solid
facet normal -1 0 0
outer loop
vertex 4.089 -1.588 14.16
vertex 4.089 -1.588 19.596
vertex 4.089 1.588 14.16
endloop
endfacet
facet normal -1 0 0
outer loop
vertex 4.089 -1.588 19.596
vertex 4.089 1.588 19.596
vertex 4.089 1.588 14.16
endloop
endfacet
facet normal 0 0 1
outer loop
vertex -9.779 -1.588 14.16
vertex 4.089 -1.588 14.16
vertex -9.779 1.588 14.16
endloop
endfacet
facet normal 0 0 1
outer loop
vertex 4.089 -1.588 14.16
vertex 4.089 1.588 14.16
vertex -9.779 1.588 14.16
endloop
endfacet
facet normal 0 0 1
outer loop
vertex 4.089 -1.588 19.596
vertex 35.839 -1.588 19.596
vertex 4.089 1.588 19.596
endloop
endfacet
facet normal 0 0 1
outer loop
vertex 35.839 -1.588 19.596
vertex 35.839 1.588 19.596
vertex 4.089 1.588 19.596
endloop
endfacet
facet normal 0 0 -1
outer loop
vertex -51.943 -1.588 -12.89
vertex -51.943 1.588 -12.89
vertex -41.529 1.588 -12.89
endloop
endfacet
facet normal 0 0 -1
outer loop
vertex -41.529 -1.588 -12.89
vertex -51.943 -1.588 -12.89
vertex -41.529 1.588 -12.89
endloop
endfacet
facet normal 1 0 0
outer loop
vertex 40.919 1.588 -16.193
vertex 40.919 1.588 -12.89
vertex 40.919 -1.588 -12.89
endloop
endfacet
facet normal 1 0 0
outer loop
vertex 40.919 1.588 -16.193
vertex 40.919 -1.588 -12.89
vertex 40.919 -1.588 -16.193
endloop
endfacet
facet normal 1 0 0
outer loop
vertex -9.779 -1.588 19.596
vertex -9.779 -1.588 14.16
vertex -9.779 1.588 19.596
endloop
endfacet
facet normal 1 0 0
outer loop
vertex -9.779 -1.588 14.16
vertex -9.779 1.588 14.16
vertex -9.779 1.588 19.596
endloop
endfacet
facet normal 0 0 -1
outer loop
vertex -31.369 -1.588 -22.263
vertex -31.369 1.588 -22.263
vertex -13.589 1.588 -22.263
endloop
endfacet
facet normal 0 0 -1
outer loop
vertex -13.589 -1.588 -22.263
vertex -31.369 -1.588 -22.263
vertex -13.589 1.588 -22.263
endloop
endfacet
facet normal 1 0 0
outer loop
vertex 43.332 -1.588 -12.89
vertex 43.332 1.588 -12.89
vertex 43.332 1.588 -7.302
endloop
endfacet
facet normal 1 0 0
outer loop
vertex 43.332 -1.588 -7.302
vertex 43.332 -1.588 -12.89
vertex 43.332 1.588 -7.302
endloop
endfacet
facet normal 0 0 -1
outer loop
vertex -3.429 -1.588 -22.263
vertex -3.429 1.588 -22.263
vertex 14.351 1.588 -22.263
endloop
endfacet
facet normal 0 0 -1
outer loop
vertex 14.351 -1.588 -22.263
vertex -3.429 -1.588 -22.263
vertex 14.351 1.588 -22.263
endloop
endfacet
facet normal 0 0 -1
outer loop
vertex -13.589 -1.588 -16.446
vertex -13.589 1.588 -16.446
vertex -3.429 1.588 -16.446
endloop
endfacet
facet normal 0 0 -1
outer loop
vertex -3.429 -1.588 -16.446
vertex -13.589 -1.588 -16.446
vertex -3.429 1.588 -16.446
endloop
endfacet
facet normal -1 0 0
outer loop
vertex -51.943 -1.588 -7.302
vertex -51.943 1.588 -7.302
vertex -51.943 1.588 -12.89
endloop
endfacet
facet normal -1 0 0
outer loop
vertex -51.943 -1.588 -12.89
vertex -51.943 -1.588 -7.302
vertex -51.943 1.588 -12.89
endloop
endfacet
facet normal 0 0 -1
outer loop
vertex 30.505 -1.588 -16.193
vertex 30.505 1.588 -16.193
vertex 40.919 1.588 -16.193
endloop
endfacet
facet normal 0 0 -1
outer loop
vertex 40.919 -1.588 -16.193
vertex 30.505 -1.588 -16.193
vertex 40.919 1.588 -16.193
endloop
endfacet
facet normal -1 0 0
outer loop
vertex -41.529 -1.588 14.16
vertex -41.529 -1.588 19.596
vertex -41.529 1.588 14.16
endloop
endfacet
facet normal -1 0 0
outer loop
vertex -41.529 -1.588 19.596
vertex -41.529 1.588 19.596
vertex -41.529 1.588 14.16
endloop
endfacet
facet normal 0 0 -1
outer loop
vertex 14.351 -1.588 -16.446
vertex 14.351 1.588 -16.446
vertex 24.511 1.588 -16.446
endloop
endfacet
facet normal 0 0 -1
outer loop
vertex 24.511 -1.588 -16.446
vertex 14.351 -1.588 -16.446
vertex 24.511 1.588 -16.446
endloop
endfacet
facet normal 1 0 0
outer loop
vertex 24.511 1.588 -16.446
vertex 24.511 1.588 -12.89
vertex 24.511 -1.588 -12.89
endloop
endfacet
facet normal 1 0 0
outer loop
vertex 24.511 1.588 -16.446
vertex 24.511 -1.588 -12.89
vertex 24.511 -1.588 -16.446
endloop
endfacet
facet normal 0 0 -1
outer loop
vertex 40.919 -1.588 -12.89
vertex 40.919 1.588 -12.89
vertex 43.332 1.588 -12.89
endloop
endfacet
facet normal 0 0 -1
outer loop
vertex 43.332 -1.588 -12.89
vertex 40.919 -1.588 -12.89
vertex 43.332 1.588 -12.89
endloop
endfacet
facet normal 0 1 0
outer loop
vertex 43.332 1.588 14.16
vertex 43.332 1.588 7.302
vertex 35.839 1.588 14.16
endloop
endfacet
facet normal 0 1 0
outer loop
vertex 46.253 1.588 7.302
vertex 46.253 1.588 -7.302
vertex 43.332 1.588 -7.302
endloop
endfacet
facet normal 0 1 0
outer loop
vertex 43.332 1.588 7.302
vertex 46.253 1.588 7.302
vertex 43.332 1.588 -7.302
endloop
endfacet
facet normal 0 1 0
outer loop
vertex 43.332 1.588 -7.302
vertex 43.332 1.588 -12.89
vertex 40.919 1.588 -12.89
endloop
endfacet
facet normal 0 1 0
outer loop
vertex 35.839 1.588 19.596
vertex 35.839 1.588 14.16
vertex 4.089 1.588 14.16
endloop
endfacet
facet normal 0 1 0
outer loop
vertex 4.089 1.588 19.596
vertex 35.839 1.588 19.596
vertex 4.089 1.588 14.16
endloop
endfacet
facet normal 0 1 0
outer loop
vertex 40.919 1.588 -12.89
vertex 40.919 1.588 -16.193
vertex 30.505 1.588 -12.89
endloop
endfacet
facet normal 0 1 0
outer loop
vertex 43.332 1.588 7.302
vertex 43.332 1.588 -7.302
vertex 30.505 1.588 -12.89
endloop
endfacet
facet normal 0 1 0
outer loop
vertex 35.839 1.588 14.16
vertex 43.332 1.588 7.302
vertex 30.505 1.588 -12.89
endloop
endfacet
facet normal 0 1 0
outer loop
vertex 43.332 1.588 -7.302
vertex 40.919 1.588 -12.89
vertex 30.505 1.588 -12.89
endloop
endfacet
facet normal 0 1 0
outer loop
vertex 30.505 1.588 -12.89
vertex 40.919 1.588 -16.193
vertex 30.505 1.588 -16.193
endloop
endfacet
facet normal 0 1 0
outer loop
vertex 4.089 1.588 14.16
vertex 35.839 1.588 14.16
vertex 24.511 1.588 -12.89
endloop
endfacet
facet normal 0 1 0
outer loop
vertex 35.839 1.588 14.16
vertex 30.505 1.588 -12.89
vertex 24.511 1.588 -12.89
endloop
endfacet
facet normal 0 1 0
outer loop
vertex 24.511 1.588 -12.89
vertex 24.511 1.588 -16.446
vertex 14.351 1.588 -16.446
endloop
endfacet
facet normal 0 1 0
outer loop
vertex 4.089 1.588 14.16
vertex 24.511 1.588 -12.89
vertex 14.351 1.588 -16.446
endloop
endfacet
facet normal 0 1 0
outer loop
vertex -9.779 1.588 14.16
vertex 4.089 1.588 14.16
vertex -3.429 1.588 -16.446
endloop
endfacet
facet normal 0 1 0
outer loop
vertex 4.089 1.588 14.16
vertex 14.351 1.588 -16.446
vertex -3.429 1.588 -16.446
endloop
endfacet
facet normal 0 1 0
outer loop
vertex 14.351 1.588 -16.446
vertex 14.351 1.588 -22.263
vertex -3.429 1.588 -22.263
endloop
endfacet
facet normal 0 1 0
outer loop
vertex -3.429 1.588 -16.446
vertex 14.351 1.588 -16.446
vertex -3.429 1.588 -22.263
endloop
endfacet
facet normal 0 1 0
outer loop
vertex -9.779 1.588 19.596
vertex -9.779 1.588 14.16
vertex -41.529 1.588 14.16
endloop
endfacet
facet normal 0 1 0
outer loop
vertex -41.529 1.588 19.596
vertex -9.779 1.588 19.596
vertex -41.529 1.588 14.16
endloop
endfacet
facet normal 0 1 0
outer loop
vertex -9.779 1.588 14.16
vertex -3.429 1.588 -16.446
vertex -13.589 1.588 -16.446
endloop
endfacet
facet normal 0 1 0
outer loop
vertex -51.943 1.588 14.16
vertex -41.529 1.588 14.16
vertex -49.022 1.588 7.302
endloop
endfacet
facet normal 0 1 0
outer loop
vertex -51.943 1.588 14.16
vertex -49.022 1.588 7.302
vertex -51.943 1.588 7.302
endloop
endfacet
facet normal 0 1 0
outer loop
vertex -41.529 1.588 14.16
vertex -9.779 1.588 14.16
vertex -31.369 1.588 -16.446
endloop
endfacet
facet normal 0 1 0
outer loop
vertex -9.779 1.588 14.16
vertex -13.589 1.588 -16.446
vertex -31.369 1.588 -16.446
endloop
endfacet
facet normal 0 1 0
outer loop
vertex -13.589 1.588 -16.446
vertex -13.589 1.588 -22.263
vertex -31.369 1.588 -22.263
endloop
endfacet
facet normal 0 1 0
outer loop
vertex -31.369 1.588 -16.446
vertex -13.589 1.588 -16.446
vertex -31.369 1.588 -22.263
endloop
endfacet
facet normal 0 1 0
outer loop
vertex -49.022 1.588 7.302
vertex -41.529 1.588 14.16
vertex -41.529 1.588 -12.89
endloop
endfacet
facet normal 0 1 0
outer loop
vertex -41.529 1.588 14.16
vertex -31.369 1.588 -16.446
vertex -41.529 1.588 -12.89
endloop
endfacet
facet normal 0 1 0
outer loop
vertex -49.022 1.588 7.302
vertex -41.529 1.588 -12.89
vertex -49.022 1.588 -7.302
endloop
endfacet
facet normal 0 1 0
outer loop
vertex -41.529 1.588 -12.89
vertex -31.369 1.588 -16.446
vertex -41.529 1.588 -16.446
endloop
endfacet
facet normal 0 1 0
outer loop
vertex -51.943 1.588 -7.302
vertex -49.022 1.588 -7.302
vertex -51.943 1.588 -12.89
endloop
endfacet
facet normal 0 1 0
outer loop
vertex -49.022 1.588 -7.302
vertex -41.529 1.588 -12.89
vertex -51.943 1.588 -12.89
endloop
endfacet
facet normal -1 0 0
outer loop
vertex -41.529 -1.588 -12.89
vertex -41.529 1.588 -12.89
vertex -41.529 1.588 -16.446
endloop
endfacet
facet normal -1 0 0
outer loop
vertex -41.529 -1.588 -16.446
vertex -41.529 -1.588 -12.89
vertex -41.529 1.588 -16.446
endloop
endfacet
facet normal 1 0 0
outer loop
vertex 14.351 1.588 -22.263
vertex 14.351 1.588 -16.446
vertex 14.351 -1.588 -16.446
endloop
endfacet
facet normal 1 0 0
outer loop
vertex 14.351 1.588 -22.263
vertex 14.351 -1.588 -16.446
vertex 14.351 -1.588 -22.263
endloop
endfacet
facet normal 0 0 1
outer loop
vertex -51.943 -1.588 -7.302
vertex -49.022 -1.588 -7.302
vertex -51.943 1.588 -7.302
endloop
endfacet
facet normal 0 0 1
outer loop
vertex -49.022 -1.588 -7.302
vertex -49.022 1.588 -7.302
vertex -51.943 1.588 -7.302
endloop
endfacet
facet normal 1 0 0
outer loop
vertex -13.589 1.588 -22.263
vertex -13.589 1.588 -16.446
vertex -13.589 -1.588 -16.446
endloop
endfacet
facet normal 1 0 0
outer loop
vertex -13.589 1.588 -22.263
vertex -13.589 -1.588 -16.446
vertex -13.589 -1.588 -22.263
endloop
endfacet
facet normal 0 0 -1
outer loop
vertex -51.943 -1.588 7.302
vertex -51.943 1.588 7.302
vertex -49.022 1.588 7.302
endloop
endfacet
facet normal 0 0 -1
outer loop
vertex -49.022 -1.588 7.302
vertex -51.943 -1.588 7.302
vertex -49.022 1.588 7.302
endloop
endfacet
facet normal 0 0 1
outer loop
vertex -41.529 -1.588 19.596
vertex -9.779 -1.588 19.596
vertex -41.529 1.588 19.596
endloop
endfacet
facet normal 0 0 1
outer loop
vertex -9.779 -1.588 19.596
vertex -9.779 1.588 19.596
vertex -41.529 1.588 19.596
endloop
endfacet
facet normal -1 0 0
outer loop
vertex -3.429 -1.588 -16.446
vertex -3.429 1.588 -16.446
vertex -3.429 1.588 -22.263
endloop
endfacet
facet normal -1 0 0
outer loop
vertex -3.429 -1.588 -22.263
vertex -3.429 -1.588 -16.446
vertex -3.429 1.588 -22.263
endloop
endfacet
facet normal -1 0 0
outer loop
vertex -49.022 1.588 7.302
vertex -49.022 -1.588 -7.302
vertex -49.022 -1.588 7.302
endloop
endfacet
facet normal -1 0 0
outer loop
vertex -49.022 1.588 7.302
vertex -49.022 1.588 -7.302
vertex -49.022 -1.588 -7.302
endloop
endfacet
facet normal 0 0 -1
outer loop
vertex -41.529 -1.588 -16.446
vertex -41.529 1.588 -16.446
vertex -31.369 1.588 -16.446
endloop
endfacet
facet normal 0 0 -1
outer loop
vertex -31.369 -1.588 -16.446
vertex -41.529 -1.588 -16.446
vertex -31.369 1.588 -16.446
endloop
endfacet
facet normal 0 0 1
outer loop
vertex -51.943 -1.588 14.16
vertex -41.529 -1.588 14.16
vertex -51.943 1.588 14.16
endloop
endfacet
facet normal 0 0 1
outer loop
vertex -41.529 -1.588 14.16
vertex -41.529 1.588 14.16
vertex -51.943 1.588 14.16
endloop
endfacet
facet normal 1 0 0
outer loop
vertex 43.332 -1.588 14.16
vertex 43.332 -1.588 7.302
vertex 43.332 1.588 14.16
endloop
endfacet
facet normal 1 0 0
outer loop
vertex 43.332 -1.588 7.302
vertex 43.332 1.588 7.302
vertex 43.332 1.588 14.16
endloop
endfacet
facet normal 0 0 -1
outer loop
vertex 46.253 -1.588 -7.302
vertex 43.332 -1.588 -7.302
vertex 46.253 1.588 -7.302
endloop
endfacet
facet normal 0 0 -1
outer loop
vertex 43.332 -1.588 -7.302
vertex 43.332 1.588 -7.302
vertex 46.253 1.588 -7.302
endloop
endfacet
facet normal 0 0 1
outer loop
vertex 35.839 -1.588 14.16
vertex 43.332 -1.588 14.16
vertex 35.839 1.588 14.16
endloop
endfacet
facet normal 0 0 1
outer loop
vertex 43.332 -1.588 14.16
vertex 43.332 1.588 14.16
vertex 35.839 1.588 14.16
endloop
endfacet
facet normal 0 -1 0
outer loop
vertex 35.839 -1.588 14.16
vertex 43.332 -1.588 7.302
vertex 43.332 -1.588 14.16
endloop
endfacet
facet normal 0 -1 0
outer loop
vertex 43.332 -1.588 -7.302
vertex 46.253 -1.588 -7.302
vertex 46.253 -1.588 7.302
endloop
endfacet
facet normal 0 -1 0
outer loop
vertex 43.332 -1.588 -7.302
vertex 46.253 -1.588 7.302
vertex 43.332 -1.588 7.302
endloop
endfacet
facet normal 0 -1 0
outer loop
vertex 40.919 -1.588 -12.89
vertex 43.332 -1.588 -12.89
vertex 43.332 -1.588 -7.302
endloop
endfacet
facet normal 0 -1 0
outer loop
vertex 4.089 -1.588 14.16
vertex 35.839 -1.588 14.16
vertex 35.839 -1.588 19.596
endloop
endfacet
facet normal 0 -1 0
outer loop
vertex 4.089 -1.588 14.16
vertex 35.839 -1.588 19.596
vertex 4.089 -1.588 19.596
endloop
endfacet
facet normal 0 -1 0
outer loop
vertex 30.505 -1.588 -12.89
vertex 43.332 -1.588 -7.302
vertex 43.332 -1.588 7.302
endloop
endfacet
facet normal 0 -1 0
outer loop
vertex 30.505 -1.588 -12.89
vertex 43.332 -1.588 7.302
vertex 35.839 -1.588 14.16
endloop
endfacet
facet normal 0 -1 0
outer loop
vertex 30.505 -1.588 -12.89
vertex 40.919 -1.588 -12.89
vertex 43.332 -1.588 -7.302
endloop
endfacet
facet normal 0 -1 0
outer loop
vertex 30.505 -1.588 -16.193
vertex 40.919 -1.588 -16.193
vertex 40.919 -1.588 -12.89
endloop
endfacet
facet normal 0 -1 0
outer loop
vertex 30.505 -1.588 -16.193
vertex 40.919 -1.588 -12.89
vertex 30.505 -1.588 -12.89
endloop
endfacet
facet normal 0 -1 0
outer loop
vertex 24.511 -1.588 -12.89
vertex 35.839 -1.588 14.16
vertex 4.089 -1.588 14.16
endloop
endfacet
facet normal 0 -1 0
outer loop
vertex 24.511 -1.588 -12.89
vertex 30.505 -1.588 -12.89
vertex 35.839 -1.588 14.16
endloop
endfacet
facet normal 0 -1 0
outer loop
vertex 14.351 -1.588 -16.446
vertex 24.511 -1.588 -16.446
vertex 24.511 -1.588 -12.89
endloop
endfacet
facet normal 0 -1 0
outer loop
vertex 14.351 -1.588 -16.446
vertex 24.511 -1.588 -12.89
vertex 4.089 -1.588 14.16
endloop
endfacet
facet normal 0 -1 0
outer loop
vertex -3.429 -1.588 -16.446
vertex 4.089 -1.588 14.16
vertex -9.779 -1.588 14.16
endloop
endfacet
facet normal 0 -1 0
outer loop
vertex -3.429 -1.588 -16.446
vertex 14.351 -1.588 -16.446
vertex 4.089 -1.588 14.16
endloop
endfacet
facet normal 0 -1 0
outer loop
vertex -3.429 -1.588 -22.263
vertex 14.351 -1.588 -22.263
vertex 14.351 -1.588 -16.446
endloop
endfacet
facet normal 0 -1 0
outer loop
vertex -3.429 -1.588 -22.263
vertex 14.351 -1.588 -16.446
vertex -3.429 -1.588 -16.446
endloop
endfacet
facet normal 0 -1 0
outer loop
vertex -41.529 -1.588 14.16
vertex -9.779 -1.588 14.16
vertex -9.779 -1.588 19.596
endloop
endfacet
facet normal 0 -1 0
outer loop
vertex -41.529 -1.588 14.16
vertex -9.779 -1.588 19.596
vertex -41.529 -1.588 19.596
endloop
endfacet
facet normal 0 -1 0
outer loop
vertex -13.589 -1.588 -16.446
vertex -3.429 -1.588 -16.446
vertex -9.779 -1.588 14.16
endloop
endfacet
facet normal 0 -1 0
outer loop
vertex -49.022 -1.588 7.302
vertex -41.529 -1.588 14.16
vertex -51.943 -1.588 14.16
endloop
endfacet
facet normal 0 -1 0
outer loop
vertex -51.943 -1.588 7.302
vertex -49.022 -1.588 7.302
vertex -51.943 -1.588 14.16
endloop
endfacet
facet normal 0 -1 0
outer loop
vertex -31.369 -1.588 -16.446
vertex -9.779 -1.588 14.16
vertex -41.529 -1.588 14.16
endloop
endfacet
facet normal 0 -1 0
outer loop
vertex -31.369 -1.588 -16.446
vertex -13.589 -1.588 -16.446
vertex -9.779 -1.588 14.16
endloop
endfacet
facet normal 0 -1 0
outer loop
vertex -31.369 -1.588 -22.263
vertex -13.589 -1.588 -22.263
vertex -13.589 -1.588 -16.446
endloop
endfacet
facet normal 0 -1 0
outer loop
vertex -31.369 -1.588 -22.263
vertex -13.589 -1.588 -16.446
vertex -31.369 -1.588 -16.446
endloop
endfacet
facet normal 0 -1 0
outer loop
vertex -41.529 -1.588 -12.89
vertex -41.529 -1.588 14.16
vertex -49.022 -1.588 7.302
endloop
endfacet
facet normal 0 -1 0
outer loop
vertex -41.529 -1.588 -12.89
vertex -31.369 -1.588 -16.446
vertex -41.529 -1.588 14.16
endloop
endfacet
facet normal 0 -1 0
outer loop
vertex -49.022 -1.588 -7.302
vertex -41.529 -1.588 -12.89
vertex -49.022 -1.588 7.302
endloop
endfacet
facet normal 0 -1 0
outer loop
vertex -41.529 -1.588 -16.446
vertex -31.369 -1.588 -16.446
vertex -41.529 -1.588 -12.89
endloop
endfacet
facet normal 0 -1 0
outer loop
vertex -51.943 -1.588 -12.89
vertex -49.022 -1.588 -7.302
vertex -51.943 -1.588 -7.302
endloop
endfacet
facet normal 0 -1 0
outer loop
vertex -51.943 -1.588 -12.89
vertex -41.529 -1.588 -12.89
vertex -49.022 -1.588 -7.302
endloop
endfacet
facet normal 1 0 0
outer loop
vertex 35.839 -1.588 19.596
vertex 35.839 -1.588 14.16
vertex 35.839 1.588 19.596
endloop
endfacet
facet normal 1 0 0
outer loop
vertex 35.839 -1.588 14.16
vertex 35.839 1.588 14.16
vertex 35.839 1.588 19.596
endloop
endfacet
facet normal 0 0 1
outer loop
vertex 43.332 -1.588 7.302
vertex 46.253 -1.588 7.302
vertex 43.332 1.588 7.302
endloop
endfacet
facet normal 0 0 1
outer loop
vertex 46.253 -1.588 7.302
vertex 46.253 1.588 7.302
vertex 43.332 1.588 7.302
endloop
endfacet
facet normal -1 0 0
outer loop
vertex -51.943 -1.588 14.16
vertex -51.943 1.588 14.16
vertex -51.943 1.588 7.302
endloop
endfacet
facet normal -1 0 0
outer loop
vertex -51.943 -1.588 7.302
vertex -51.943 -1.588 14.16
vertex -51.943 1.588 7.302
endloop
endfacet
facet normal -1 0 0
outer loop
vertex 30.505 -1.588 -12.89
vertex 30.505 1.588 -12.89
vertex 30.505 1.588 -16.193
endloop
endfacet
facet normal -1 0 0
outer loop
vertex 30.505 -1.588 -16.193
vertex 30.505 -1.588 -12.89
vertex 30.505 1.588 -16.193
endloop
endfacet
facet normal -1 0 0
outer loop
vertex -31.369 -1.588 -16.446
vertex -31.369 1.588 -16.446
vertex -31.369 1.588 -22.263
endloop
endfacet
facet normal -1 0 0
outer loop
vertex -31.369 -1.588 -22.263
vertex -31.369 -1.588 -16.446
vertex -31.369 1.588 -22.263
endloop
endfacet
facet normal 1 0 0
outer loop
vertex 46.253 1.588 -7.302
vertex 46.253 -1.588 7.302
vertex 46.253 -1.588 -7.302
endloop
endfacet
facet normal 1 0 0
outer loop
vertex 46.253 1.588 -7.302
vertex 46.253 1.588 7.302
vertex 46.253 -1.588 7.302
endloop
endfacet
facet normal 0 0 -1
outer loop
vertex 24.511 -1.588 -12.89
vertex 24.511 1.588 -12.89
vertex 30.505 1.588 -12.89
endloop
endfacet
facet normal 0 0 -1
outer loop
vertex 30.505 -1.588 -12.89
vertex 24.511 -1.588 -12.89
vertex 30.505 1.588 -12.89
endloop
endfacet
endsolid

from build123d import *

# Parameters (mm, degrees)
BOSS_EXTRUDE2_DEPTH = 1.5875
SKETCH2_W           = 10.414
SKETCH2_H           = 1.27
SKETCH2_W_2         = 5.9944
SKETCH2_H_2         = 1.016
SKETCH2_W_3         = 2.413
SKETCH2_H_3         = 1.3716
CUT_EXTRUDE1_DEPTH  = 57.702519048
SKETCH3_W           = 10.16
SKETCH3_H           = 0.635
SKETCH3_W_2         = 10.414
CUT_EXTRUDE2_DEPTH  = 57.702519048
SKETCH4_W           = 17.78
SKETCH4_H           = 0.254
CUT_EXTRUDE3_DEPTH  = 57.702519048
SKETCH5_W           = 10.414
SKETCH5_H           = 0.254
CUT_EXTRUDE4_DEPTH  = 57.602133313


with BuildPart() as part:
    # Sketch1 → Boss-Extrude2 (new, symmetric)
    with BuildSketch(Plane(origin=(0, 0, 0), x_dir=(1, 0, 0), z_dir=(0, 1, 0))):
        Polygon((-49.022, -7.3025), (-49.022, 0), (-49.022, 7.3025), (-51.943, 7.3025), (-51.943, 14.1605), (-41.529, 14.1605), (-41.529, 17.0815), (-31.369, 17.0815), (-31.369, 22.5171), (-13.589, 22.5171), (-13.589, 17.0815), (-3.429, 17.0815), (-3.429, 22.5171), (14.351, 22.5171), (14.351, 17.0815), (24.511, 17.0815), (24.511, 13.9065), (30.5054, 13.9065), (30.5054, 17.0815), (40.9194, 17.0815), (40.9194, 14.2621), (43.3324, 14.2621), (43.3324, 7.3025), (46.2534, 7.3025), (46.2534, 0), (46.2534, -7.3025), (43.3324, -7.3025), (43.3324, -14.1605), (35.8394, -14.1605), (35.8394, -19.5961), (4.0894, -19.5961), (4.0894, -14.1605), (-9.779, -14.1605), (-9.779, -19.5961), (-41.529, -19.5961), (-41.529, -14.1605), (-51.943, -14.1605), (-51.943, -7.3025), align=None)
    extrude(amount=BOSS_EXTRUDE2_DEPTH, both=True)

    # Sketch2 → Cut-Extrude1 (cut, through all)
    with BuildSketch(Plane(origin=(0, 1.5875, 0), x_dir=(1, 0, 0), z_dir=(0, 1, 0))):
        with Locations((-46.736, 13.5255)):
            Rectangle(SKETCH2_W, SKETCH2_H)
        with Locations((27.5082, 13.3985)):
            Rectangle(SKETCH2_W_2, SKETCH2_H_2)
        with Locations((42.1259, 13.5763)):
            Rectangle(SKETCH2_W_3, SKETCH2_H_3)
    extrude(amount=-CUT_EXTRUDE1_DEPTH, mode=Mode.SUBTRACT)

    # Sketch3 → Cut-Extrude2 (cut, through all)
    with BuildSketch(Plane(origin=(0, 1.5875, 0), x_dir=(1, 0, 0), z_dir=(0, 1, 0))):
        with Locations((-36.449, 16.764)):
            Rectangle(SKETCH3_W, SKETCH3_H)
        with Locations((-8.509, 16.764)):
            Rectangle(SKETCH3_W, SKETCH3_H)
        with Locations((19.431, 16.764)):
            Rectangle(SKETCH3_W, SKETCH3_H)
        with Locations((35.7124, 16.764)):
            Rectangle(SKETCH3_W_2, SKETCH3_H)
    extrude(amount=-CUT_EXTRUDE2_DEPTH, mode=Mode.SUBTRACT)

    # Sketch4 → Cut-Extrude3 (cut, through all)
    with BuildSketch(Plane(origin=(0, 1.5875, 0), x_dir=(1, 0, 0), z_dir=(0, 1, 0))):
        with Locations((-22.479, 22.3901)):
            Rectangle(SKETCH4_W, SKETCH4_H)
        with Locations((5.461, 22.3901)):
            Rectangle(SKETCH4_W, SKETCH4_H)
    extrude(amount=-CUT_EXTRUDE3_DEPTH, mode=Mode.SUBTRACT)

    # Sketch5 → Cut-Extrude4 (cut, through all)
    with BuildSketch(Plane(origin=(0, 1.5875, 0), x_dir=(1, 0, 0), z_dir=(0, 1, 0))):
        with Locations((35.7124, 16.3195)):
            Rectangle(SKETCH5_W, SKETCH5_H)
    extrude(amount=-CUT_EXTRUDE4_DEPTH, mode=Mode.SUBTRACT)


solid = part.part
